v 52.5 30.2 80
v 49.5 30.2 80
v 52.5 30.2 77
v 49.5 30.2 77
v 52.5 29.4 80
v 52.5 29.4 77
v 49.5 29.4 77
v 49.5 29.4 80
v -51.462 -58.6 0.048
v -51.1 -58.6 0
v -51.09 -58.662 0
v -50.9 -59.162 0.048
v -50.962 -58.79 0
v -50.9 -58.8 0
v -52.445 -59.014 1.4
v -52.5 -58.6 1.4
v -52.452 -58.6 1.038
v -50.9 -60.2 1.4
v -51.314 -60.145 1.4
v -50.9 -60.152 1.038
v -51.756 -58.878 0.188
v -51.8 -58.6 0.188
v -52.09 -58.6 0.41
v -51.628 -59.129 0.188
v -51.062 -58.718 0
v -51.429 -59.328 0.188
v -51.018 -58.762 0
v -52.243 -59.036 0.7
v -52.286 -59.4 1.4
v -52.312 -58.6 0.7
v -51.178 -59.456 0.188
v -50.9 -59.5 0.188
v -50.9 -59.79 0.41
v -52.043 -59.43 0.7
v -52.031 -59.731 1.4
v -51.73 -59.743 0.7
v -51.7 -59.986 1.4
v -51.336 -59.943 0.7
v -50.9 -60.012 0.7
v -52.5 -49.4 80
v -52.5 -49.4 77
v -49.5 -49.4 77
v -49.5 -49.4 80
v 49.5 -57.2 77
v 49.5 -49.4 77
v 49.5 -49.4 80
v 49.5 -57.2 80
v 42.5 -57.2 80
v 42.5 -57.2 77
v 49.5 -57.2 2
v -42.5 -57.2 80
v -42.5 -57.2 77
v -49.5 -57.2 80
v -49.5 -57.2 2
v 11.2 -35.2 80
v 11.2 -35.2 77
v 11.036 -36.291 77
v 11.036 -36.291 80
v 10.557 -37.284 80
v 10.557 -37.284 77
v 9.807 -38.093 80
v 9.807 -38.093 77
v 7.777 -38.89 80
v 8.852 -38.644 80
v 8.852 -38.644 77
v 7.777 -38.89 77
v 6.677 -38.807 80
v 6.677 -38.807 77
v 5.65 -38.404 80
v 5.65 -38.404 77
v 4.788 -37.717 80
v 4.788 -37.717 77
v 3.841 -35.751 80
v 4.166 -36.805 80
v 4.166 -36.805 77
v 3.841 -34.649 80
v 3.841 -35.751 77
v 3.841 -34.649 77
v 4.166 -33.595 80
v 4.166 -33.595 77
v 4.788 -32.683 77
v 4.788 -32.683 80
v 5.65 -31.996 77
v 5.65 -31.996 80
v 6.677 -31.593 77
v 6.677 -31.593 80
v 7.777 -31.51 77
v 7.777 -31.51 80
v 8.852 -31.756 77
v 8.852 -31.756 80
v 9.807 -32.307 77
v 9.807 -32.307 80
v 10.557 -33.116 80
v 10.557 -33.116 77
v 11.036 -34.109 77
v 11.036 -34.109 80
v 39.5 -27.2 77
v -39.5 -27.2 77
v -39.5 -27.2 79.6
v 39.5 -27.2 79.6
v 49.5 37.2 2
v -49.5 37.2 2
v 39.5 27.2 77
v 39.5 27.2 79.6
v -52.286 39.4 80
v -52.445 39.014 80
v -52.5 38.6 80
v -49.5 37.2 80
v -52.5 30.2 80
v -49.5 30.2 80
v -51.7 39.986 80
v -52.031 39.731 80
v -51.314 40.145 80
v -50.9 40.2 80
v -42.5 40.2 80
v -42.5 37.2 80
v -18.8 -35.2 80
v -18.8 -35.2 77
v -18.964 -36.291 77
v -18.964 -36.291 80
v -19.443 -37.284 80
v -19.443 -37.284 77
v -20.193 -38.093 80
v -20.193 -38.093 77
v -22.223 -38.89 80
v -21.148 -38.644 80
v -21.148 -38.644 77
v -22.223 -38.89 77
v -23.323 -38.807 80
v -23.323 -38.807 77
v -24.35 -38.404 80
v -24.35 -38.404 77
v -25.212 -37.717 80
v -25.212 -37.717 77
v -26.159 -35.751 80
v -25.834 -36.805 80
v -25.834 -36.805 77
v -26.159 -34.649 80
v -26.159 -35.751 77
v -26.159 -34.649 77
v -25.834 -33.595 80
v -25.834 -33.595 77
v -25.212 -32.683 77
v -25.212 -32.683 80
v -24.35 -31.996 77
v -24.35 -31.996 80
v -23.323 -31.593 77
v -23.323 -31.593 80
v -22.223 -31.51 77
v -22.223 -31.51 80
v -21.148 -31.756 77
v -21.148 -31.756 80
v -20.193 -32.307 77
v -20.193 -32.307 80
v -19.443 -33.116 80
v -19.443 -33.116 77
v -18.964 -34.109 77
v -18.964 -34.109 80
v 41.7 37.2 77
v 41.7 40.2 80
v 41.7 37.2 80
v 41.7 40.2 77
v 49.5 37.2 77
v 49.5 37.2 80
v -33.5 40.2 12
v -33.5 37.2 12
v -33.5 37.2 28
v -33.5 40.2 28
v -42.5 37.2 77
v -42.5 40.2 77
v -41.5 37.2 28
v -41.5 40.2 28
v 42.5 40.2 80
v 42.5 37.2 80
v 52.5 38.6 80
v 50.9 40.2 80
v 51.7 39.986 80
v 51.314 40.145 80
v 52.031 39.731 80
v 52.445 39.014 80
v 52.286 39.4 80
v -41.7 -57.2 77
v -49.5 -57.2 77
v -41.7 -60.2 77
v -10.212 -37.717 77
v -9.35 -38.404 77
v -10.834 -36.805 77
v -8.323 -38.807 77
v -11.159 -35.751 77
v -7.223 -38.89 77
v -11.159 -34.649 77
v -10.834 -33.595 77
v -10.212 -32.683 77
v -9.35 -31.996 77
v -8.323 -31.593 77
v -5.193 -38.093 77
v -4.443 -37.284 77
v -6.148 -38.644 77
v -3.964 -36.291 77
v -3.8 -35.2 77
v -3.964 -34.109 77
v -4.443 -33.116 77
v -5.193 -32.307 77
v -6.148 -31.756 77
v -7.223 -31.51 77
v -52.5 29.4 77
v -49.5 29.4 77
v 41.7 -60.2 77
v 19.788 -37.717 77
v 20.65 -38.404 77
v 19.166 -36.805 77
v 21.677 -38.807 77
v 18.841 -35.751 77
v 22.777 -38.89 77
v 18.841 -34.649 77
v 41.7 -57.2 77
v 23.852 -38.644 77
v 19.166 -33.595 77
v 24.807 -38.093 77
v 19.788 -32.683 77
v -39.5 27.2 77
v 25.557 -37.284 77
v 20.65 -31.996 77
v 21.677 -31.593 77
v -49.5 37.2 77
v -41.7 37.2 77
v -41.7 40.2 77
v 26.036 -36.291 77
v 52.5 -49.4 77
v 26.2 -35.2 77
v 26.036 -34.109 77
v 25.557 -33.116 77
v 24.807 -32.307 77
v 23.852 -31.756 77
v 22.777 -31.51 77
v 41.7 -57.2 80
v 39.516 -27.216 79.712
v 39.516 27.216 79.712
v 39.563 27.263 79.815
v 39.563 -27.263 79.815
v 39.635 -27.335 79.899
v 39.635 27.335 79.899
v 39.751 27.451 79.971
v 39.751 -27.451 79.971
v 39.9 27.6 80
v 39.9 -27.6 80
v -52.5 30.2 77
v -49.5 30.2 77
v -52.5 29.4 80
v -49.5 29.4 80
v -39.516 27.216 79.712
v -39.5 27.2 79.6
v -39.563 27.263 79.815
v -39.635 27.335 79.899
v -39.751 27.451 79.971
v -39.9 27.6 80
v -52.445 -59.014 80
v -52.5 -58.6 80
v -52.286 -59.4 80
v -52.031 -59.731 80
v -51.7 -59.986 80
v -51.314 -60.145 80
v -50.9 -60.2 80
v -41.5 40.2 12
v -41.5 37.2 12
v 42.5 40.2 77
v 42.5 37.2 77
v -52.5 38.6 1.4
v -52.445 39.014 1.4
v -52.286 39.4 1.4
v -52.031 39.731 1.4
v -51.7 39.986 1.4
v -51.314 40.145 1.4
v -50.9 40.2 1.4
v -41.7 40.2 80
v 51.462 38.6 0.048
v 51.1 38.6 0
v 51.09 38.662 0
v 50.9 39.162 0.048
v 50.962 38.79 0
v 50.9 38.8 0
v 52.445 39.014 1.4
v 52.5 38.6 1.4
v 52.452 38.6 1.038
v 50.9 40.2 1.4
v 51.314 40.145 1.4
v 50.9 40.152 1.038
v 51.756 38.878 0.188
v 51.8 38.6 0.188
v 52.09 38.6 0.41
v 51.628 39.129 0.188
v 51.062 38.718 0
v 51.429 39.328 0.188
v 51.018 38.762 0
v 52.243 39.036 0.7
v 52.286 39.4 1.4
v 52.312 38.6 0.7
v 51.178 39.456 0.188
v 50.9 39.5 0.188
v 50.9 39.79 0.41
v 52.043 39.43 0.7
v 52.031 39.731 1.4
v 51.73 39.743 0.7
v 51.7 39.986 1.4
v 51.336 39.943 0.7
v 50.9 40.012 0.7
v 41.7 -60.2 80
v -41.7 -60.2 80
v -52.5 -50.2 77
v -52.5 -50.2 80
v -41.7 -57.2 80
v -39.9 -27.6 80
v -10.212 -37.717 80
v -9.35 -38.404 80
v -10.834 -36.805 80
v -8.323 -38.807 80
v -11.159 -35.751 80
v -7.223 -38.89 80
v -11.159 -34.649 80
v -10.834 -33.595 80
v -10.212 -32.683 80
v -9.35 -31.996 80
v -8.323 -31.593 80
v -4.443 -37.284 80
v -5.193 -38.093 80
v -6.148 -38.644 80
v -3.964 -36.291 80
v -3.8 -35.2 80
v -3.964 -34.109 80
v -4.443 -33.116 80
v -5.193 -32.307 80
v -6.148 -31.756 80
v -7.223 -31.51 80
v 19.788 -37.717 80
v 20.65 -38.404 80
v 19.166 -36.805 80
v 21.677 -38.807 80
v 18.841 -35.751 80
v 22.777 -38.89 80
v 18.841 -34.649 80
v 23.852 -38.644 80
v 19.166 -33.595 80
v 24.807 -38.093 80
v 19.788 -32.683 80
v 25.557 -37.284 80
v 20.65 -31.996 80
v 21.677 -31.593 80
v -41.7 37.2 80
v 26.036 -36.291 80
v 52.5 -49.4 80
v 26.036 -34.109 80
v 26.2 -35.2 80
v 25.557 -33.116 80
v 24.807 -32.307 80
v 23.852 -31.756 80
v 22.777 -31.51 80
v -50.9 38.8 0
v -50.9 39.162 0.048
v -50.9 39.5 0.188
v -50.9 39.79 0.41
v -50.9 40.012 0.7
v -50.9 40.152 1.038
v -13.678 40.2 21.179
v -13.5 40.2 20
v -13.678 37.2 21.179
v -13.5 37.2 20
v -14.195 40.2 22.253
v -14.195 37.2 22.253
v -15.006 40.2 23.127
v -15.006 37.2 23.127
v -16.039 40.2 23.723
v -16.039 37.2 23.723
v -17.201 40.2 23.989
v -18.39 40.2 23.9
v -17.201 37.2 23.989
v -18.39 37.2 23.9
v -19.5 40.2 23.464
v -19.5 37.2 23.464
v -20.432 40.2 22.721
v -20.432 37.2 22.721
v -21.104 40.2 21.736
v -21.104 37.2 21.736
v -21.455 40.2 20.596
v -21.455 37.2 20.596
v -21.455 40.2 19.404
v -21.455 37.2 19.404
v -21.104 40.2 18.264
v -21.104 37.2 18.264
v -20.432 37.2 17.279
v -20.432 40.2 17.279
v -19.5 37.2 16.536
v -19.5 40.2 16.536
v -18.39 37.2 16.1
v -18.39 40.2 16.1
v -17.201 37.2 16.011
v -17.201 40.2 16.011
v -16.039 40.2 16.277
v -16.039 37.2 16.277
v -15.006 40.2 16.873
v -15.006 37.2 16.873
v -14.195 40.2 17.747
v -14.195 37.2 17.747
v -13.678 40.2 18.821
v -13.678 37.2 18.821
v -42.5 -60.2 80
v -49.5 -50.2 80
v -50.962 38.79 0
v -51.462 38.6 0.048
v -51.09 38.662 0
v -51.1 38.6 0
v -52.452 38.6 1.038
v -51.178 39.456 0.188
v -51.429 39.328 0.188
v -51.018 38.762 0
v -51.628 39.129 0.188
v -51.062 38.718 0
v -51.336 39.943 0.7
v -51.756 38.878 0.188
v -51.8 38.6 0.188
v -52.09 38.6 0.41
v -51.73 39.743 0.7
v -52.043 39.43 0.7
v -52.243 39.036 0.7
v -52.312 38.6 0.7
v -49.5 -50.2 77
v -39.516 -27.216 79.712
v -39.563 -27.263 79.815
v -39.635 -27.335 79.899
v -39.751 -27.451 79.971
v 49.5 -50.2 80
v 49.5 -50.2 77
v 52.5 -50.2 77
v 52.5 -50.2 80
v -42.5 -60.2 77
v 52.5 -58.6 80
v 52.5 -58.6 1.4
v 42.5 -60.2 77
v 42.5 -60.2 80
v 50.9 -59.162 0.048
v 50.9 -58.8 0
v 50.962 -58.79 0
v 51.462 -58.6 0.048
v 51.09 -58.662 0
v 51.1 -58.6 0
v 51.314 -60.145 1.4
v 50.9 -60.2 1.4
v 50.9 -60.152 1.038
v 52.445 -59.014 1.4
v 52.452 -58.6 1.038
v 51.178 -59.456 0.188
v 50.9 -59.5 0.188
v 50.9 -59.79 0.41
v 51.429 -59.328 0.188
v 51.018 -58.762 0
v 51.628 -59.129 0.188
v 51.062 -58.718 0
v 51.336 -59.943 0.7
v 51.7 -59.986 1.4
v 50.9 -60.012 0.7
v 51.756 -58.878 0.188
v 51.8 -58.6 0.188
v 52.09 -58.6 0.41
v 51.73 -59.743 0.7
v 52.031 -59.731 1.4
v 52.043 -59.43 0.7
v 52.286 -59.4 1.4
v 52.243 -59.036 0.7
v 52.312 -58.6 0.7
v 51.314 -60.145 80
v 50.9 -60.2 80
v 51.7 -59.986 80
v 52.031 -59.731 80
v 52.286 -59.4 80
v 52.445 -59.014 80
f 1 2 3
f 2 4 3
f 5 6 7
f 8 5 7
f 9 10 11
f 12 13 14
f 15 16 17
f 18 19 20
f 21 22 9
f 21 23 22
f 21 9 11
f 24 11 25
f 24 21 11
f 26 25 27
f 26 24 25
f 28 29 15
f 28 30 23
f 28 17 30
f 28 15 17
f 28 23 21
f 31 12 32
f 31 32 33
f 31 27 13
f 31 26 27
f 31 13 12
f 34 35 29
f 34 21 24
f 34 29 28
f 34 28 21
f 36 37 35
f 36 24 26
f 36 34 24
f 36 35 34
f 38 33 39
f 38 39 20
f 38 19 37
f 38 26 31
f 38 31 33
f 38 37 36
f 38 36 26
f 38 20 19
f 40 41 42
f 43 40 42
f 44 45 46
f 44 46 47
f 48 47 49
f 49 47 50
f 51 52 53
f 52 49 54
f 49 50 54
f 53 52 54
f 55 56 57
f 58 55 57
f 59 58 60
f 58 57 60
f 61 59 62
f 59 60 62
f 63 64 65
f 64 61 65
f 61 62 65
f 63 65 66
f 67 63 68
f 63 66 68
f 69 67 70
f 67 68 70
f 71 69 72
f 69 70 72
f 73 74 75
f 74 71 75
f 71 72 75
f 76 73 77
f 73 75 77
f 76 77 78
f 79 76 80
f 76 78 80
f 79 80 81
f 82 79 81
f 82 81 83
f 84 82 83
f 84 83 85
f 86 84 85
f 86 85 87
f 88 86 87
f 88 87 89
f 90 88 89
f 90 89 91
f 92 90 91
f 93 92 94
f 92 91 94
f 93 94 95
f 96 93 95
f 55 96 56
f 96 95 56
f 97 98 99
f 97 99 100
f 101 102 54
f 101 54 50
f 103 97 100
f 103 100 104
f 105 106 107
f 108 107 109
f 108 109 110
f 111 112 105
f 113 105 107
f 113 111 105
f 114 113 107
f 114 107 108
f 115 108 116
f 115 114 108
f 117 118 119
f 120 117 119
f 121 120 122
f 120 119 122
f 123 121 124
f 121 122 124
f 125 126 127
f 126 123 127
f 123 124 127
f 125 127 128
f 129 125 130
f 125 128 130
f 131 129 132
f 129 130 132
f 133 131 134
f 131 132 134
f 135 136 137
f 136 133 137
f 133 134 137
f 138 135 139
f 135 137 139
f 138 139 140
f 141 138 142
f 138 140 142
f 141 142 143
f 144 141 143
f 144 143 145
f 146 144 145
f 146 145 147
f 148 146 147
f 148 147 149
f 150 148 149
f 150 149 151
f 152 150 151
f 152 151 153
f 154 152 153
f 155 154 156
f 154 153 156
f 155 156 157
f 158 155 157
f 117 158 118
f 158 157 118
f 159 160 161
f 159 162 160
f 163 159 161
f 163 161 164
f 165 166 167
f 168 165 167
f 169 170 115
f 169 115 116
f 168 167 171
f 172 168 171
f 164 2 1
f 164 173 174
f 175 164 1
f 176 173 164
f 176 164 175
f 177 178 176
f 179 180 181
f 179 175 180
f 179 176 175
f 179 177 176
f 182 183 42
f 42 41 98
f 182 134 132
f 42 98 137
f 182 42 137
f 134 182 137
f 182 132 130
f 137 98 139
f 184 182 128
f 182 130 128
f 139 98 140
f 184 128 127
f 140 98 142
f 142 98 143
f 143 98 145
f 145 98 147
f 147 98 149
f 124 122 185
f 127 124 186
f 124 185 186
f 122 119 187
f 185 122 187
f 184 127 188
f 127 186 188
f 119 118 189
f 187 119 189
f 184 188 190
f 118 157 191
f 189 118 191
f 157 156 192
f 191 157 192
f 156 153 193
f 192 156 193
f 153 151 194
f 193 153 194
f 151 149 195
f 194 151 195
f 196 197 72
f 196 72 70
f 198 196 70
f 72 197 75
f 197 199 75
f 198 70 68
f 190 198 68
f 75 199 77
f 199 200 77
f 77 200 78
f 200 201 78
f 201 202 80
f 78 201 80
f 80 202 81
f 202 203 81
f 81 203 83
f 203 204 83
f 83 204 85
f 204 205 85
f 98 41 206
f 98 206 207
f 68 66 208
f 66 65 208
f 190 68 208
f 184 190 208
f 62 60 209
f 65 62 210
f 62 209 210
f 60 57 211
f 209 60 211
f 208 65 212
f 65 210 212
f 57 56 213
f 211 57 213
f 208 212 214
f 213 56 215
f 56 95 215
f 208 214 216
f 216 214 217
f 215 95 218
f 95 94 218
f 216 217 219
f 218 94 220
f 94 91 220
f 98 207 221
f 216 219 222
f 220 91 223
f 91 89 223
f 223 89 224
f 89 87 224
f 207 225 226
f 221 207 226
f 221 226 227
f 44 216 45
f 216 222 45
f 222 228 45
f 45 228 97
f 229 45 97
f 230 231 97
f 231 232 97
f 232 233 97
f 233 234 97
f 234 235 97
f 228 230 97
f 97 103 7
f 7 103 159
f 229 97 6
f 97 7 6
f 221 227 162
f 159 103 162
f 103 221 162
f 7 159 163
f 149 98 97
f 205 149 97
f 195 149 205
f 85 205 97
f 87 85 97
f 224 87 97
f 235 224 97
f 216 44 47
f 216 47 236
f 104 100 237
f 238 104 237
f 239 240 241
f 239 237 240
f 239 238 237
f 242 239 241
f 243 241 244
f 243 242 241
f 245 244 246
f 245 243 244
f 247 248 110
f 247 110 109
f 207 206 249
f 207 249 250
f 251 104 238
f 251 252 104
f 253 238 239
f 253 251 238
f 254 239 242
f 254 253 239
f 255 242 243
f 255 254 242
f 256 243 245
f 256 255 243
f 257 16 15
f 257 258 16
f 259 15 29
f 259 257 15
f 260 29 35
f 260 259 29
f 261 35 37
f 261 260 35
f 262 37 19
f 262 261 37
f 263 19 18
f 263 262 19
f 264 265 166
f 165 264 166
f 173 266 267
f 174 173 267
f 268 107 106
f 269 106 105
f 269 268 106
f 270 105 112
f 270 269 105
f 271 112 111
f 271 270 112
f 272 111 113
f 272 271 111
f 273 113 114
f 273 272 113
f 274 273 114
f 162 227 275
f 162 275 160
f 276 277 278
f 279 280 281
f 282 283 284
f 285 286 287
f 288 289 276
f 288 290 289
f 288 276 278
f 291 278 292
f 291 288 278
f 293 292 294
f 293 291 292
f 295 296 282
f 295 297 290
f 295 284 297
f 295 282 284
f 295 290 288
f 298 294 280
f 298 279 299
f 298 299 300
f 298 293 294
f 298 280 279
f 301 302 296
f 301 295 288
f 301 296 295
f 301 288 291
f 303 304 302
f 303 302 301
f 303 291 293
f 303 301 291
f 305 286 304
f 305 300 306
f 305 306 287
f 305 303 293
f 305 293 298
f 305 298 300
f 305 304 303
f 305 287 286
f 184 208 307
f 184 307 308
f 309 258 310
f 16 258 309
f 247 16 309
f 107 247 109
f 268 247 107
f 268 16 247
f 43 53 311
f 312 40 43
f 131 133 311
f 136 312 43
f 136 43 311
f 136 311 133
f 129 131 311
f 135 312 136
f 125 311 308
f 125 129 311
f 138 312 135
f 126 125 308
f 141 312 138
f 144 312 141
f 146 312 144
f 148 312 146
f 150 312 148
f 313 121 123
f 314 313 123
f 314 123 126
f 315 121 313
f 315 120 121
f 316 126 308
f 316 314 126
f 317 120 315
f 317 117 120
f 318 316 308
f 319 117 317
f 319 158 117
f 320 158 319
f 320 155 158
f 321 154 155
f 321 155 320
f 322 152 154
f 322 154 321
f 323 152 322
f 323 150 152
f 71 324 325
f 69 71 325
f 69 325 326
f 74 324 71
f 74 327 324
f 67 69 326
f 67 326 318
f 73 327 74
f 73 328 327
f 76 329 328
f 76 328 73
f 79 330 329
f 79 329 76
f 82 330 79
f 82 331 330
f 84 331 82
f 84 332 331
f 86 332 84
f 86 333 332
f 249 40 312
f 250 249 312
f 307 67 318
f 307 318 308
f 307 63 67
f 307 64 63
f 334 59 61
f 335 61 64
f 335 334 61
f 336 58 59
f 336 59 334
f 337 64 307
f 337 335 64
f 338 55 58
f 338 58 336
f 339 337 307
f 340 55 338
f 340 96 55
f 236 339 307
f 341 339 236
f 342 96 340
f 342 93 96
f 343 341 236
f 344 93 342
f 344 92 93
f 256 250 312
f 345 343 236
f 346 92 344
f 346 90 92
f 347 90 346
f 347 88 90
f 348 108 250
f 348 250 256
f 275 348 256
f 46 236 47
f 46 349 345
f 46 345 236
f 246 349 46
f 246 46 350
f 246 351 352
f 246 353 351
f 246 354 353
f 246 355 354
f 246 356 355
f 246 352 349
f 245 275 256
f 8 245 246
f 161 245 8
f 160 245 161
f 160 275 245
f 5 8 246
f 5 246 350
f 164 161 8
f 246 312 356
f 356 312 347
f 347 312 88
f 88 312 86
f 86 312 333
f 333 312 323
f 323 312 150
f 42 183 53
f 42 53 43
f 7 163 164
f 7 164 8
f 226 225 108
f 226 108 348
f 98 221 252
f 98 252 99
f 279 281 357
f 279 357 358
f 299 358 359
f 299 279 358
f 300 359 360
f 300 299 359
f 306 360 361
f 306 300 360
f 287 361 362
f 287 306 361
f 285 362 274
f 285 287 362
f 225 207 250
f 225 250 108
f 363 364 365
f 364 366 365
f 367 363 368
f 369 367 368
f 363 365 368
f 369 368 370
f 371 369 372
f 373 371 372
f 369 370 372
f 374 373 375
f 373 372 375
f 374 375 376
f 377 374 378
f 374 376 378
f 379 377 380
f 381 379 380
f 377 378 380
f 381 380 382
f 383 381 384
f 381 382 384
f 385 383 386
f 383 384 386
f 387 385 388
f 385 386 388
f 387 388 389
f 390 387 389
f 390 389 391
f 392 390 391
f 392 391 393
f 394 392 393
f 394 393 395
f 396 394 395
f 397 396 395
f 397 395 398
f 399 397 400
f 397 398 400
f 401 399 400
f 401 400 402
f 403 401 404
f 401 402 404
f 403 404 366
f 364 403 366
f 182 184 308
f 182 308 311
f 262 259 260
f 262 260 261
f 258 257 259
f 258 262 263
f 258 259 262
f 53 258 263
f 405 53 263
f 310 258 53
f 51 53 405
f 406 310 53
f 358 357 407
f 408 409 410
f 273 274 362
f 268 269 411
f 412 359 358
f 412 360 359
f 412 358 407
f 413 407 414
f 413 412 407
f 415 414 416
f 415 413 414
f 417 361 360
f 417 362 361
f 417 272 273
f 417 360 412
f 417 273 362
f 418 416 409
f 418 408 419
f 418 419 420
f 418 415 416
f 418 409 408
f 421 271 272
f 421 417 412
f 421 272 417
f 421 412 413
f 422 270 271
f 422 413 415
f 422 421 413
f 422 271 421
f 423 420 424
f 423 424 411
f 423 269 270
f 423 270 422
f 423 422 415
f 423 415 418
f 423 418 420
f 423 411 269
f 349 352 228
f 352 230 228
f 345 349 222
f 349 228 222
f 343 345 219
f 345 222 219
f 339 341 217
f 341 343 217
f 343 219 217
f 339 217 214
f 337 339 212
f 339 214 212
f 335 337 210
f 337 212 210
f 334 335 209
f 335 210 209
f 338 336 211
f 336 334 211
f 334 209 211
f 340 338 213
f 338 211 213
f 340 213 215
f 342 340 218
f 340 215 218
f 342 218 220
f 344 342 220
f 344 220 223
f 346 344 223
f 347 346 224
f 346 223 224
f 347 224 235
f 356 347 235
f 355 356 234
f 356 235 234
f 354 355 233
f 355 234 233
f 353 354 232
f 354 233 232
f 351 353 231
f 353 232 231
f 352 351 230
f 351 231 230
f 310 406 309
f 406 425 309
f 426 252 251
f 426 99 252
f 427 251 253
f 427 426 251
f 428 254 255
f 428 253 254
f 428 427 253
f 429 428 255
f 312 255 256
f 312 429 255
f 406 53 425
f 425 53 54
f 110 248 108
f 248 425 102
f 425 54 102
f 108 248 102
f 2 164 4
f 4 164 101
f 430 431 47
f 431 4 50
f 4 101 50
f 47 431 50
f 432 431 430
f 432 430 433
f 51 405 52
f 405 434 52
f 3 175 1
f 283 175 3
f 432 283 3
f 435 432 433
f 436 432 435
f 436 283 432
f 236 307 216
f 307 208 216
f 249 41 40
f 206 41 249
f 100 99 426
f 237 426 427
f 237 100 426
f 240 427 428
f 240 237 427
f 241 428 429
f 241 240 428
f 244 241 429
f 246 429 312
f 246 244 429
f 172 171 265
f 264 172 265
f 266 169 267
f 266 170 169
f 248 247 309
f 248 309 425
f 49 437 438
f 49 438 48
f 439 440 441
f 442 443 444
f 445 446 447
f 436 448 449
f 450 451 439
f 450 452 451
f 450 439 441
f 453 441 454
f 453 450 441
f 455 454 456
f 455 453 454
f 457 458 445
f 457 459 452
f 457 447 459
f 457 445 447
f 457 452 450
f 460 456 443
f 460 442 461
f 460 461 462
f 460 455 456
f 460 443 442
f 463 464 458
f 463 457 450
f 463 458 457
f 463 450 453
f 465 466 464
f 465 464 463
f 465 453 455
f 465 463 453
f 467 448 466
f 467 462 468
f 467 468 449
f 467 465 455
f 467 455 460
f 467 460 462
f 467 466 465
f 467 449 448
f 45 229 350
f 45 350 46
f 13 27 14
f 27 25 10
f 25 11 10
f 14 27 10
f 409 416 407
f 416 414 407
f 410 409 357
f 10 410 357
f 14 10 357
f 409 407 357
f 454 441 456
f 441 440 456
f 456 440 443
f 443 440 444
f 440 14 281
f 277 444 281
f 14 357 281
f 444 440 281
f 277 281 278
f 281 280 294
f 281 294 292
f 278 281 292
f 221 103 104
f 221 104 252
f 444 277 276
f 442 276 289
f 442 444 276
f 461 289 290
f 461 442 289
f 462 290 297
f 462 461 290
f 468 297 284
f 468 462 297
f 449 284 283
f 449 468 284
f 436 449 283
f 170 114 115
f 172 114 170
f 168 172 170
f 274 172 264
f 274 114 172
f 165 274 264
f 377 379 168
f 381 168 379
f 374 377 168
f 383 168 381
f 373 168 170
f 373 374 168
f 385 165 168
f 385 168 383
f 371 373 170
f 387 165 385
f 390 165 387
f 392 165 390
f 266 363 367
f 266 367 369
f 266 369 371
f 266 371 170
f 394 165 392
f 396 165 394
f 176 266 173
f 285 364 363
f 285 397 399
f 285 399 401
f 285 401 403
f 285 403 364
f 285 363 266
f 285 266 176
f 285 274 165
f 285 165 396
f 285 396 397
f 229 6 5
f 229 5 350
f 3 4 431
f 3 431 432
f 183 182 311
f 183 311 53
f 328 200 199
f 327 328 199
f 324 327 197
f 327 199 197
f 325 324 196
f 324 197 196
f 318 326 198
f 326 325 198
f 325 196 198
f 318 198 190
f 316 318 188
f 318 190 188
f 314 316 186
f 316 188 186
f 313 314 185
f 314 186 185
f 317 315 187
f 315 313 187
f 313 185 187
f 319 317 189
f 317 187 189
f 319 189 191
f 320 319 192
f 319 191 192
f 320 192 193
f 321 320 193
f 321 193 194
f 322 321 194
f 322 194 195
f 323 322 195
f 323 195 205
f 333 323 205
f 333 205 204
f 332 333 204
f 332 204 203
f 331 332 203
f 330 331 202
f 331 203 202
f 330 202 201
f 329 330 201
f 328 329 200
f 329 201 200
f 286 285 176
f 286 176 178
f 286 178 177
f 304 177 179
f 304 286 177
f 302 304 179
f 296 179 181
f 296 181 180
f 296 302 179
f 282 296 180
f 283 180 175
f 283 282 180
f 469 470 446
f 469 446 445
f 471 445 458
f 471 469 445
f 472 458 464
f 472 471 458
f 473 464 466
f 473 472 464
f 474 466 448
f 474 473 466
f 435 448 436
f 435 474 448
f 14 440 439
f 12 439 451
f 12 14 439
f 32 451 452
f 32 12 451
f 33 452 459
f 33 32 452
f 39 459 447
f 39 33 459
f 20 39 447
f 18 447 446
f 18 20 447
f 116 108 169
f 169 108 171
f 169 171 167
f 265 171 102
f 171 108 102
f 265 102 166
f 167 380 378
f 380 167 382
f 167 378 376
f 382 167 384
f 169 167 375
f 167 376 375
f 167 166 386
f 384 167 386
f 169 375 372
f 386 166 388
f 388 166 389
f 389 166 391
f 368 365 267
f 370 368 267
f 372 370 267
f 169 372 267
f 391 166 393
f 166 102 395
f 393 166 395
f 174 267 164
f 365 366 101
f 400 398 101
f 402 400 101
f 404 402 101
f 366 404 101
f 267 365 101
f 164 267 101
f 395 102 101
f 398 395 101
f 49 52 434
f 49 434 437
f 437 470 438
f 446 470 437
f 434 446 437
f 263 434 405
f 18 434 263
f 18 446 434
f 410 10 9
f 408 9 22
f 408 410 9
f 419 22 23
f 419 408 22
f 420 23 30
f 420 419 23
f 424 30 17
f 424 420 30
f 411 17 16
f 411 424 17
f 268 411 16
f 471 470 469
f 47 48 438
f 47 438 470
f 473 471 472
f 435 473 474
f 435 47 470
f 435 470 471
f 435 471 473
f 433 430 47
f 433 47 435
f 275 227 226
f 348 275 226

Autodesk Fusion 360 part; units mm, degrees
sketch "Sketch2" plane through (0, 0, 0) normal (0, 0, 1) x (1, 0, 0)
  line L0 (-55, 60) -> (55, 60)
  line L1 (55, 60) -> (55, -60)
  line L2 (55, -60) -> (-55, -60)
  line L3 (-55, -60) -> (-55, 60)
  line L4 (0, 60) -> (0, -60) construction
  line L5 (55, 0) -> (-55, 0) construction
  line L6 (-55, 17.8) -> (55, 17.8) construction
  line L7 (-39.5, 45) -> (39.5, 45)
  line L8 (39.5, 45) -> (39.5, -9.4)
  line L9 (39.5, -9.4) -> (-39.5, -9.4)
  line L10 (-39.5, -9.4) -> (-39.5, 45)
  line L11 (39.5, 17.8) -> (-39.5, 17.8) construction
  line L12 (0, 45) -> (0, -9.4) construction
  line L13 (-55, -32) -> (55, -32) construction
  circle A0 centre (22.5, -32) radius 12.5
  circle A1 centre (-22.5, -32) radius 6.25
  line L14 (-6.3, -15.8) -> (-38.7, -15.8)
  line L15 (-38.7, -15.8) -> (-38.7, -48.2)
  line L16 (-38.7, -48.2) -> (-6.3, -48.2)
  line L17 (-6.3, -48.2) -> (-6.3, -15.8)
  line L18 (-6.3, -15.8) -> (-38.7, -48.2) construction
  line L19 (-38.7, -15.8) -> (-6.3, -48.2) construction
  line L20 (-4.3, -13.8) -> (-40.7, -13.8)
  line L21 (-40.7, -13.8) -> (-40.7, -50.2)
  line L22 (-40.7, -50.2) -> (-4.3, -50.2)
  line L23 (-4.3, -50.2) -> (-4.3, -13.8)
  line L24 (-32.5, -48.2) -> (-32.5, -50.2)
  line L25 (-38.7, -42) -> (-40.7, -42)
  line L26 (-22.5, -32) -> (-22.5, -50.2) construction
  point P0 (0, 17.8)
  point P1 (-22.5, -32)
  dimension "d1" = 110
  dimension "d6" = 120
  dimension "d7" = 79
  dimension "d8" = 54.4
  dimension "d9" = 15
  dimension "d12" = 25
  dimension "d13" = 12.5
  dimension "d15" = 32.4
  dimension "d16" = 32.4
  dimension "d17" = 45
  dimension "d18" = 22.5
  dimension "d19" = 28
  dimension "d42" = 2
  dimension "d63" = 10
  dimension "d64" = 10
sketch "Sketch3" plane through (0, 0, 0) normal (0, 0, 1) x (1, 0, 0)
  line L0 (-55, 60) -> (55, 60)
  line L1 (55, 60) -> (55, -60)
  line L2 (55, -60) -> (-55, -60)
  line L3 (-55, -60) -> (-55, 60)
  line L4 (55, 0) -> (-55, 0) construction
  line L5 (0, 60) -> (0, -60) construction
  line L6 (-52.6, 57.6) -> (52.6, 57.6)
  line L7 (52.6, 57.6) -> (52.6, -57.6)
  line L8 (52.6, -57.6) -> (-52.6, -57.6)
  line L9 (-52.6, -57.6) -> (-52.6, 57.6)
  line L10 (-39.6, 57.6) -> (-39.6, 44.6)
  line L11 (-39.6, 44.6) -> (-52.6, 44.6)
  line L12 (-39.6, 51.1) -> (-52.6, 51.1) construction
  line L13 (-46.1, 44.6) -> (-46.1, 57.6) construction
  circle A0 centre (-46.1, 51.1) radius 5
  line L14 (-40.4, 57.6) -> (-40.4, 60)
  line L15 (-52.6, 45.4) -> (-55, 45.4)
  line L16 (-52.6, 44.6) -> (-55, 44.6)
  line L17 (-39.6, 57.6) -> (-39.6, 60)
  line L18 (39.6, 57.6) -> (39.6, 60)
  line L19 (40.4, 57.6) -> (40.4, 60)
  circle A1 centre (46.1, 51.1) radius 5
  line L20 (39.6, 57.6) -> (39.6, 44.6)
  line L21 (39.6, 44.6) -> (52.6, 44.6)
  line L22 (52.6, 44.6) -> (55, 44.6)
  line L23 (52.6, 45.4) -> (55, 45.4)
  line L24 (40.4, -57.6) -> (40.4, -60)
  line L25 (39.6, -57.6) -> (39.6, -60)
  line L26 (39.6, -57.6) -> (39.6, -44.6)
  circle A2 centre (46.1, -51.1) radius 5
  line L27 (39.6, -44.6) -> (52.6, -44.6)
  line L28 (52.6, -44.6) -> (55, -44.6)
  line L29 (52.6, -45.4) -> (55, -45.4)
  line L30 (-39.6, -57.6) -> (-39.6, -44.6)
  line L31 (-39.6, -57.6) -> (-39.6, -60)
  line L32 (-40.4, -57.6) -> (-40.4, -60)
  circle A3 centre (-46.1, -51.1) radius 5
  line L33 (-39.6, -44.6) -> (-52.6, -44.6)
  line L34 (-52.6, -44.6) -> (-55, -44.6)
  line L35 (-52.6, -45.4) -> (-55, -45.4)
  dimension "d20" = 110
  dimension "d21" = 120
  dimension "d22" = 2.4
  dimension "d23" = 13
  dimension "d26" = 10
  dimension "d27" = 0.8
  dimension "d28" = 0.8
extrude "Extrude1" add sketch "Sketch3" along normal blind 2 contours L0 L3 L6 L9 L14 L15 | L0 L6 L14 L17 | L3 L9 L15 L16 | L0 L6 L17 L18 | L6 L9 L10 L11 | L3 L9 L16 L34 | L0 L6 L18 L19 | L6 L7 L8 L9 L10 L11 L20 L21 L26 L27 L30 L33 | L3 L9 L34 L35 | L0 L1 L6 L7 L19 L23 | L6 L7 L20 L21 | L2 L3 L8 L9 L32 L35 | L8 L9 L30 L33 | L1 L7 L22 L23 | L1 L7 L22 L28 | L2 L8 L31 L32 | L2 L8 L25 L31 | L1 L7 L28 L29 | L7 L8 L26 L27 | L2 L8 L24 L25 | L1 L2 L7 L8 L24 L29 | A0 | A1 | A2 | A3 makes body 1
extrude "Extrude2" add sketch "Sketch3" along normal blind 77 contours L0 L3 L6 L9 L14 L15 | L0 L6 L14 L17 | L3 L9 L15 L16 | L0 L6 L17 L18 | L3 L9 L16 L34 | L0 L6 L18 L19 | L3 L9 L34 L35 | L0 L1 L6 L7 L19 L23 | L2 L3 L8 L9 L32 L35 | L1 L7 L22 L23 | L1 L7 L22 L28 | L2 L8 L31 L32 | L2 L8 L25 L31 | L1 L7 L28 L29 | L2 L8 L24 L25 | L1 L2 L7 L8 L24 L29 bodies 1
extrude "Extrude3" add sketch "Sketch3" along normal blind 3 from surface at 77 contours L0 L3 L6 L9 L14 L15 | L0 L1 L6 L7 L19 L23 | L2 L3 L8 L9 L32 L35 | L1 L2 L7 L8 L24 L29 bodies 1
extrude "Extrude4" add sketch "Sketch2" along normal blind 3 from surface at 77 separate body contours L0 L1 L2 L3 | L14 L15 L16 L17 | L14 L15 L16 L17 L20 L21 L22 L23 L24 L25 | L15 L16 L21 L22 L24 L25 makes body 2
extrude "Extrude5" cut sketch "Sketch3" along normal through all contours L0 L3 L6 L9 L14 L15 | L0 L6 L14 L17 | L3 L9 L15 L16 | L0 L6 L18 L19 | L3 L9 L34 L35 | L0 L1 L6 L7 L19 L23 | L2 L3 L8 L9 L32 L35 | L1 L7 L22 L23 | L2 L8 L31 L32 | L1 L7 L28 L29 | L2 L8 L24 L25 | L1 L2 L7 L8 L24 L29 bodies 2
extrude "Extrude6" add sketch "Sketch3" along normal up to surface (75 mm away) from surface at 2 contours L6 L9 L10 L11 | L6 L7 L20 L21 | L8 L9 L30 L33 | L7 L8 L26 L27 | A0 | A1 | A2 | A3 bodies 1
extrude "Extrude7" cut sketch "Sketch3" against normal blind 1.5 from surface at 77 contours A0 | A1 | A2 | A3 bodies 1
fillet "Fillet1" radius 0.4 4 edges at (-52.6, 57.6, 78.5) (52.6, 57.6, 78.5) (52.6, -57.6, 78.5) (-52.6, -57.6, 78.5) on bodies 2
extrude "Extrude8" add sketch "Sketch2" against normal blind 5 from surface at 77 contours L14 L15 L16 L17 L20 L21 L22 L23 L24 L25 bodies 2
extrude "Extrude9" cut sketch "Sketch3" along normal blind 1.5 from surface at 77 contours A0 | A1 | A2 | A3 bodies 2
fillet "Fillet2" radius 5 4 edges at (-39.6, -44.6, 39.5) (-39.6, 44.6, 39.5) (39.6, 44.6, 39.5) (39.6, -44.6, 39.5) on bodies 1
fillet "Fillet4" radius 2.5 8 edges at (39.6, 57.6, 39.5) (52.6, 44.6, 39.5) (52.6, -44.6, 39.5) (39.6, -57.6, 39.5) (-39.6, -57.6, 39.5) (-52.6, -44.6, 39.5) (-52.6, 44.6, 39.5) (-39.6, 57.6, 39.5) on bodies 1
fillet "Fillet5" radius 1.2 4 edges at (55, 60, 40) (-55, 60, 40) (-55, -60, 40) (55, -60, 40) on bodies 1
sketch "Sketch5" plane through (0, 0, 0) normal (0, 1, 0) x (1, 0, 0)
  line L0 (-55, 0) -> (55, 0)
  line L1 (55, 0) -> (55, -80)
  line L2 (55, -80) -> (-55, -80)
  line L3 (-55, -80) -> (-55, 0)
  line L4 (55, -20) -> (-55, -20) construction
  circle A0 centre (-35, -20) radius 4
  line L5 (-19, -28) -> (-11, -28)
  line L6 (-11, -28) -> (-11, -12)
  line L7 (-11, -12) -> (-19, -12)
  line L8 (-19, -12) -> (-19, -28)
  line L9 (-19, -20) -> (-11, -20) construction
  line L10 (-15, -28) -> (-15, -12) construction
  dimension "d69" = 80
  dimension "d70" = 110
  dimension "d71" = 8
  dimension "d72" = 8
  dimension "d73" = 16
  dimension "d74" = 20
  dimension "d75" = 20
  dimension "d76" = 20
extrude "Extrude10" cut sketch "Sketch5" along normal blind 85 contours A0 | L5 L6 L7 L8 bodies 1
sketch "Sketch1" plane through (0, 0, 0) normal (0, 0, 1) x (1, 0, 0) in component "V2"
  line L0 (39.5, 27.2) -> (-39.5, 27.2)
  line L1 (-39.5, 27.2) -> (-39.5, -27.2)
  line L2 (-39.5, -27.2) -> (39.5, -27.2)
  line L3 (39.5, -27.2) -> (39.5, 27.2)
  line L4 (39.5, 27.2) -> (-39.5, -27.2) construction
  line L5 (-39.5, 27.2) -> (39.5, -27.2) construction
  line L6 (-49.5, 37.2) -> (49.5, 37.2)
  line L7 (49.5, 37.2) -> (49.5, -57.2)
  line L8 (49.5, -57.2) -> (-49.5, -57.2)
  line L9 (-49.5, -57.2) -> (-49.5, 37.2)
  line L10 (0, 37.2) -> (0, -57.2) construction
  line L11 (-49.5, -35.2) -> (49.5, -35.2) construction
  circle A0 centre (-7.5, -35.2) radius 3.7
  circle A1 centre (-22.5, -35.2) radius 3.7
  circle A2 centre (22.5, -35.2) radius 3.7
  circle A3 centre (7.5, -35.2) radius 3.7
  line L12 (52.5, 40.2) -> (52.5, -60.2)
  line L13 (52.5, -60.2) -> (-52.5, -60.2)
  line L14 (-52.5, -60.2) -> (-52.5, 40.2)
  line L15 (-52.5, 40.2) -> (52.5, 40.2)
  dimension "d79" = 79
  dimension "d80" = 54.4
  dimension "d81" = 10
  dimension "d82" = 10
  dimension "d83" = 30
  dimension "d85" = 7.4
  dimension "d86" = 15
  dimension "d87" = 7.5
  dimension "d88" = -3
  dimension "d109" = 8
sketch "Sketch2 (2)" plane through (0, 0, 0) normal (0, 0, 1) x (1, 0, 0) in component "V2"
  line L0 (-49.5, 37.2) -> (49.5, 37.2)
  line L1 (49.5, 37.2) -> (49.5, -57.2)
  line L2 (49.5, -57.2) -> (-49.5, -57.2)
  line L3 (-49.5, -57.2) -> (-49.5, 37.2)
  line L4 (-52.5, 40.2) -> (52.5, 40.2)
  line L5 (52.5, 40.2) -> (52.5, -60.2)
  line L6 (52.5, -60.2) -> (-52.5, -60.2)
  line L7 (-52.5, -60.2) -> (-52.5, 40.2)
  line L8 (0, 40.2) -> (0, -60.2) construction
  line L9 (52.5, -10) -> (-52.5, -10) construction
  line L10 (-42.5, 40.2) -> (-42.5, 37.2)
  line L11 (-41.7, 40.2) -> (-41.7, 37.2)
  line L12 (-49.5, 30.2) -> (-52.5, 30.2)
  line L13 (-52.5, 29.4) -> (-49.5, 29.4)
  line L14 (41.7, 40.2) -> (41.7, 37.2)
  line L15 (42.5, 40.2) -> (42.5, 37.2)
  line L16 (49.5, 30.2) -> (52.5, 30.2)
  line L17 (52.5, 29.4) -> (49.5, 29.4)
  line L18 (-41.7, -60.2) -> (-41.7, -57.2)
  line L19 (-42.5, -60.2) -> (-42.5, -57.2)
  line L20 (-49.5, -50.2) -> (-52.5, -50.2)
  line L21 (-52.5, -49.4) -> (-49.5, -49.4)
  line L22 (42.5, -60.2) -> (42.5, -57.2)
  line L23 (41.7, -60.2) -> (41.7, -57.2)
  line L24 (49.5, -50.2) -> (52.5, -50.2)
  line L25 (52.5, -49.4) -> (49.5, -49.4)
  point P0 (-49.5, 37.2)
  point P1 (49.5, -57.2)
  dimension "d89" = -3
  dimension "d90" = 0.8
  dimension "d91" = 0.8
  dimension "d92" = 10
  dimension "d93" = 10
extrude "Extrude2'" add sketch "Sketch2 (2)" along normal blind 2 separate body makes body 3 in component "V2"
extrude "Extrude3'" add sketch "Sketch2 (2)" along normal blind 77 contours L0 L3 L4 L7 L10 L12 | L0 L4 L10 L11 | L3 L7 L12 L13 | L0 L4 L11 L14 | L3 L7 L13 L21 | L0 L4 L14 L15 | L3 L7 L20 L21 | L0 L1 L4 L5 L15 L16 | L2 L3 L6 L7 L19 L20 | L1 L5 L16 L17 | L2 L6 L18 L19 | L1 L5 L17 L25 | L2 L6 L18 L23 | L1 L5 L24 L25 | L2 L6 L22 L23 | L1 L2 L5 L6 L22 L24 bodies 3 in component "V2"
extrude "Extrude4'" add sketch "Sketch2 (2)" along normal blind 3 from surface at 77 contours L0 L3 L4 L7 L10 L12 | L0 L1 L4 L5 L15 L16 | L2 L3 L6 L7 L19 L20 | L1 L2 L5 L6 L22 L24 bodies 3 in component "V2"
extrude "Extrude5'" add sketch "Sketch1" along normal blind 3 from surface at 77 separate body contours L6 L7 L8 L9 makes body 4 in component "V2"
extrude "Extrude6'" add sketch "Sketch2 (2)" along normal up to surface (3 mm away) from surface at 77 contours L0 L4 L11 L14 | L3 L7 L13 L21 | L1 L5 L17 L25 | L2 L6 L18 L23 bodies 4 in component "V2"
fillet "Fillet1'" radius 1.6 4 edges at (-52.5, -60.2, 40) (52.5, -60.2, 40) (52.5, 40.2, 40) (-52.5, 40.2, 40) on bodies 3 in component "V2"
fillet "Fillet2'" radius 1.4 8 edges at (52.0314, 39.7314, 0) (52.5, -10, 0) (52.0314, -59.7314, 0) (0, -60.2, 0) (-52.0314, -59.7314, 0) (-52.5, -10, 0) (-52.0314, 39.7314, 0) (0, 40.2, 0) on bodies 3 in component "V2"
fillet "Fillet3" radius 0.4 4 edges at (0, 27.2, 80) (39.5, 0, 80) (-39.5, 0, 80) (0, -27.2, 80) on bodies 4 in component "V2"
sketch "Sketch3 (2)" plane through (0, 0, 0) normal (0, 1, 0) x (1, 0, 0) in component "V2"
  line L0 (52.5, 0) -> (-52.5, 0)
  line L1 (-52.5, 0) -> (-52.5, -77)
  line L2 (-52.5, -77) -> (52.5, -77)
  line L3 (52.5, -77) -> (52.5, 0)
  line L4 (0, -77) -> (0, 0) construction
  line L5 (-52.5, -20) -> (52.5, -20) construction
  line L6 (-33.5, -28) -> (-41.5, -28)
  line L7 (-41.5, -28) -> (-41.5, -12)
  line L8 (-41.5, -12) -> (-33.5, -12)
  line L9 (-33.5, -12) -> (-33.5, -28)
  line L10 (-33.5, -20) -> (-41.5, -20) construction
  circle A0 centre (-17.5, -20) radius 4
  line L11 (-37.5, -28) -> (-37.5, -12) construction
  point P0 (52.5, 0)
  point P1 (-37.5, -20)
  dimension "d118" = 8
  dimension "d119" = 16
  dimension "d120" = 8
  dimension "d121" = 20
  dimension "d122" = 15
  dimension "d123" = 20
extrude "Extrude7'" cut sketch "Sketch3 (2)" along normal blind 75 contours L6 L7 L8 L9 | A0 bodies 3 in component "V2"
delete_body "RemoveBody1" bodies 1
delete_body "RemoveBody2" bodies 2
component "V2" placed x (1, 0, 0) y (0, 1, 0) z (0, 0, 1) at (0, 0, 0)
equation "d1 = breiteTotal"
equation "breiteTotal = 110 mm"
equation "längeTotal = 120 mm"
equation "breiteDrucker = 79 mm" comment "gmessen 77.5"
equation "längeDrucker = 54.4 mm" comment "gem: 53.8"
equation "d6 = längeTotal"
equation "d7 = breiteDrucker"
equation "d8 = längeDrucker"
equation "buttonLoch = 25 mm"
equation "modusSwitch = 12.5 mm"
equation "d12 = buttonLoch"
equation "d13 = modusSwitch"
equation "modusSwitchPlatte = 32.4 mm"
equation "d15 = modusSwitchPlatte"
equation "d16 = modusSwitchPlatte"
equation "d18 = d17 / 2"
equation "d20 = breiteTotal"
equation "d21 = längeTotal"
equation "magnetDurchmesser = 10 mm"
equation "deckelDicke = 3 mm"
equation "gesamtHöhe = 80 mm"
equation "d33 = gesamtHöhe - deckelDicke"
equation "d36 = deckelDicke"
equation "d38 = deckelDicke"
equation "magnetDicke = 1.5 mm"
equation "d48 = -magnetDicke"
equation "d57 = magnetDicke"
equation "d69 = gesamtHöhe"
equation "d70 = breiteTotal"
equation "d79 = breiteDrucker"
equation "d80 = längeDrucker"
equation "smallButtonDurchmesser = 7.4 mm"
equation "d85 = smallButtonDurchmesser"
equation "d87 = d86 / 2"
equation "d98 = gesamtHöhe - deckelDicke"
equation "d101 = deckelDicke"
equation "d104 = deckelDicke"
